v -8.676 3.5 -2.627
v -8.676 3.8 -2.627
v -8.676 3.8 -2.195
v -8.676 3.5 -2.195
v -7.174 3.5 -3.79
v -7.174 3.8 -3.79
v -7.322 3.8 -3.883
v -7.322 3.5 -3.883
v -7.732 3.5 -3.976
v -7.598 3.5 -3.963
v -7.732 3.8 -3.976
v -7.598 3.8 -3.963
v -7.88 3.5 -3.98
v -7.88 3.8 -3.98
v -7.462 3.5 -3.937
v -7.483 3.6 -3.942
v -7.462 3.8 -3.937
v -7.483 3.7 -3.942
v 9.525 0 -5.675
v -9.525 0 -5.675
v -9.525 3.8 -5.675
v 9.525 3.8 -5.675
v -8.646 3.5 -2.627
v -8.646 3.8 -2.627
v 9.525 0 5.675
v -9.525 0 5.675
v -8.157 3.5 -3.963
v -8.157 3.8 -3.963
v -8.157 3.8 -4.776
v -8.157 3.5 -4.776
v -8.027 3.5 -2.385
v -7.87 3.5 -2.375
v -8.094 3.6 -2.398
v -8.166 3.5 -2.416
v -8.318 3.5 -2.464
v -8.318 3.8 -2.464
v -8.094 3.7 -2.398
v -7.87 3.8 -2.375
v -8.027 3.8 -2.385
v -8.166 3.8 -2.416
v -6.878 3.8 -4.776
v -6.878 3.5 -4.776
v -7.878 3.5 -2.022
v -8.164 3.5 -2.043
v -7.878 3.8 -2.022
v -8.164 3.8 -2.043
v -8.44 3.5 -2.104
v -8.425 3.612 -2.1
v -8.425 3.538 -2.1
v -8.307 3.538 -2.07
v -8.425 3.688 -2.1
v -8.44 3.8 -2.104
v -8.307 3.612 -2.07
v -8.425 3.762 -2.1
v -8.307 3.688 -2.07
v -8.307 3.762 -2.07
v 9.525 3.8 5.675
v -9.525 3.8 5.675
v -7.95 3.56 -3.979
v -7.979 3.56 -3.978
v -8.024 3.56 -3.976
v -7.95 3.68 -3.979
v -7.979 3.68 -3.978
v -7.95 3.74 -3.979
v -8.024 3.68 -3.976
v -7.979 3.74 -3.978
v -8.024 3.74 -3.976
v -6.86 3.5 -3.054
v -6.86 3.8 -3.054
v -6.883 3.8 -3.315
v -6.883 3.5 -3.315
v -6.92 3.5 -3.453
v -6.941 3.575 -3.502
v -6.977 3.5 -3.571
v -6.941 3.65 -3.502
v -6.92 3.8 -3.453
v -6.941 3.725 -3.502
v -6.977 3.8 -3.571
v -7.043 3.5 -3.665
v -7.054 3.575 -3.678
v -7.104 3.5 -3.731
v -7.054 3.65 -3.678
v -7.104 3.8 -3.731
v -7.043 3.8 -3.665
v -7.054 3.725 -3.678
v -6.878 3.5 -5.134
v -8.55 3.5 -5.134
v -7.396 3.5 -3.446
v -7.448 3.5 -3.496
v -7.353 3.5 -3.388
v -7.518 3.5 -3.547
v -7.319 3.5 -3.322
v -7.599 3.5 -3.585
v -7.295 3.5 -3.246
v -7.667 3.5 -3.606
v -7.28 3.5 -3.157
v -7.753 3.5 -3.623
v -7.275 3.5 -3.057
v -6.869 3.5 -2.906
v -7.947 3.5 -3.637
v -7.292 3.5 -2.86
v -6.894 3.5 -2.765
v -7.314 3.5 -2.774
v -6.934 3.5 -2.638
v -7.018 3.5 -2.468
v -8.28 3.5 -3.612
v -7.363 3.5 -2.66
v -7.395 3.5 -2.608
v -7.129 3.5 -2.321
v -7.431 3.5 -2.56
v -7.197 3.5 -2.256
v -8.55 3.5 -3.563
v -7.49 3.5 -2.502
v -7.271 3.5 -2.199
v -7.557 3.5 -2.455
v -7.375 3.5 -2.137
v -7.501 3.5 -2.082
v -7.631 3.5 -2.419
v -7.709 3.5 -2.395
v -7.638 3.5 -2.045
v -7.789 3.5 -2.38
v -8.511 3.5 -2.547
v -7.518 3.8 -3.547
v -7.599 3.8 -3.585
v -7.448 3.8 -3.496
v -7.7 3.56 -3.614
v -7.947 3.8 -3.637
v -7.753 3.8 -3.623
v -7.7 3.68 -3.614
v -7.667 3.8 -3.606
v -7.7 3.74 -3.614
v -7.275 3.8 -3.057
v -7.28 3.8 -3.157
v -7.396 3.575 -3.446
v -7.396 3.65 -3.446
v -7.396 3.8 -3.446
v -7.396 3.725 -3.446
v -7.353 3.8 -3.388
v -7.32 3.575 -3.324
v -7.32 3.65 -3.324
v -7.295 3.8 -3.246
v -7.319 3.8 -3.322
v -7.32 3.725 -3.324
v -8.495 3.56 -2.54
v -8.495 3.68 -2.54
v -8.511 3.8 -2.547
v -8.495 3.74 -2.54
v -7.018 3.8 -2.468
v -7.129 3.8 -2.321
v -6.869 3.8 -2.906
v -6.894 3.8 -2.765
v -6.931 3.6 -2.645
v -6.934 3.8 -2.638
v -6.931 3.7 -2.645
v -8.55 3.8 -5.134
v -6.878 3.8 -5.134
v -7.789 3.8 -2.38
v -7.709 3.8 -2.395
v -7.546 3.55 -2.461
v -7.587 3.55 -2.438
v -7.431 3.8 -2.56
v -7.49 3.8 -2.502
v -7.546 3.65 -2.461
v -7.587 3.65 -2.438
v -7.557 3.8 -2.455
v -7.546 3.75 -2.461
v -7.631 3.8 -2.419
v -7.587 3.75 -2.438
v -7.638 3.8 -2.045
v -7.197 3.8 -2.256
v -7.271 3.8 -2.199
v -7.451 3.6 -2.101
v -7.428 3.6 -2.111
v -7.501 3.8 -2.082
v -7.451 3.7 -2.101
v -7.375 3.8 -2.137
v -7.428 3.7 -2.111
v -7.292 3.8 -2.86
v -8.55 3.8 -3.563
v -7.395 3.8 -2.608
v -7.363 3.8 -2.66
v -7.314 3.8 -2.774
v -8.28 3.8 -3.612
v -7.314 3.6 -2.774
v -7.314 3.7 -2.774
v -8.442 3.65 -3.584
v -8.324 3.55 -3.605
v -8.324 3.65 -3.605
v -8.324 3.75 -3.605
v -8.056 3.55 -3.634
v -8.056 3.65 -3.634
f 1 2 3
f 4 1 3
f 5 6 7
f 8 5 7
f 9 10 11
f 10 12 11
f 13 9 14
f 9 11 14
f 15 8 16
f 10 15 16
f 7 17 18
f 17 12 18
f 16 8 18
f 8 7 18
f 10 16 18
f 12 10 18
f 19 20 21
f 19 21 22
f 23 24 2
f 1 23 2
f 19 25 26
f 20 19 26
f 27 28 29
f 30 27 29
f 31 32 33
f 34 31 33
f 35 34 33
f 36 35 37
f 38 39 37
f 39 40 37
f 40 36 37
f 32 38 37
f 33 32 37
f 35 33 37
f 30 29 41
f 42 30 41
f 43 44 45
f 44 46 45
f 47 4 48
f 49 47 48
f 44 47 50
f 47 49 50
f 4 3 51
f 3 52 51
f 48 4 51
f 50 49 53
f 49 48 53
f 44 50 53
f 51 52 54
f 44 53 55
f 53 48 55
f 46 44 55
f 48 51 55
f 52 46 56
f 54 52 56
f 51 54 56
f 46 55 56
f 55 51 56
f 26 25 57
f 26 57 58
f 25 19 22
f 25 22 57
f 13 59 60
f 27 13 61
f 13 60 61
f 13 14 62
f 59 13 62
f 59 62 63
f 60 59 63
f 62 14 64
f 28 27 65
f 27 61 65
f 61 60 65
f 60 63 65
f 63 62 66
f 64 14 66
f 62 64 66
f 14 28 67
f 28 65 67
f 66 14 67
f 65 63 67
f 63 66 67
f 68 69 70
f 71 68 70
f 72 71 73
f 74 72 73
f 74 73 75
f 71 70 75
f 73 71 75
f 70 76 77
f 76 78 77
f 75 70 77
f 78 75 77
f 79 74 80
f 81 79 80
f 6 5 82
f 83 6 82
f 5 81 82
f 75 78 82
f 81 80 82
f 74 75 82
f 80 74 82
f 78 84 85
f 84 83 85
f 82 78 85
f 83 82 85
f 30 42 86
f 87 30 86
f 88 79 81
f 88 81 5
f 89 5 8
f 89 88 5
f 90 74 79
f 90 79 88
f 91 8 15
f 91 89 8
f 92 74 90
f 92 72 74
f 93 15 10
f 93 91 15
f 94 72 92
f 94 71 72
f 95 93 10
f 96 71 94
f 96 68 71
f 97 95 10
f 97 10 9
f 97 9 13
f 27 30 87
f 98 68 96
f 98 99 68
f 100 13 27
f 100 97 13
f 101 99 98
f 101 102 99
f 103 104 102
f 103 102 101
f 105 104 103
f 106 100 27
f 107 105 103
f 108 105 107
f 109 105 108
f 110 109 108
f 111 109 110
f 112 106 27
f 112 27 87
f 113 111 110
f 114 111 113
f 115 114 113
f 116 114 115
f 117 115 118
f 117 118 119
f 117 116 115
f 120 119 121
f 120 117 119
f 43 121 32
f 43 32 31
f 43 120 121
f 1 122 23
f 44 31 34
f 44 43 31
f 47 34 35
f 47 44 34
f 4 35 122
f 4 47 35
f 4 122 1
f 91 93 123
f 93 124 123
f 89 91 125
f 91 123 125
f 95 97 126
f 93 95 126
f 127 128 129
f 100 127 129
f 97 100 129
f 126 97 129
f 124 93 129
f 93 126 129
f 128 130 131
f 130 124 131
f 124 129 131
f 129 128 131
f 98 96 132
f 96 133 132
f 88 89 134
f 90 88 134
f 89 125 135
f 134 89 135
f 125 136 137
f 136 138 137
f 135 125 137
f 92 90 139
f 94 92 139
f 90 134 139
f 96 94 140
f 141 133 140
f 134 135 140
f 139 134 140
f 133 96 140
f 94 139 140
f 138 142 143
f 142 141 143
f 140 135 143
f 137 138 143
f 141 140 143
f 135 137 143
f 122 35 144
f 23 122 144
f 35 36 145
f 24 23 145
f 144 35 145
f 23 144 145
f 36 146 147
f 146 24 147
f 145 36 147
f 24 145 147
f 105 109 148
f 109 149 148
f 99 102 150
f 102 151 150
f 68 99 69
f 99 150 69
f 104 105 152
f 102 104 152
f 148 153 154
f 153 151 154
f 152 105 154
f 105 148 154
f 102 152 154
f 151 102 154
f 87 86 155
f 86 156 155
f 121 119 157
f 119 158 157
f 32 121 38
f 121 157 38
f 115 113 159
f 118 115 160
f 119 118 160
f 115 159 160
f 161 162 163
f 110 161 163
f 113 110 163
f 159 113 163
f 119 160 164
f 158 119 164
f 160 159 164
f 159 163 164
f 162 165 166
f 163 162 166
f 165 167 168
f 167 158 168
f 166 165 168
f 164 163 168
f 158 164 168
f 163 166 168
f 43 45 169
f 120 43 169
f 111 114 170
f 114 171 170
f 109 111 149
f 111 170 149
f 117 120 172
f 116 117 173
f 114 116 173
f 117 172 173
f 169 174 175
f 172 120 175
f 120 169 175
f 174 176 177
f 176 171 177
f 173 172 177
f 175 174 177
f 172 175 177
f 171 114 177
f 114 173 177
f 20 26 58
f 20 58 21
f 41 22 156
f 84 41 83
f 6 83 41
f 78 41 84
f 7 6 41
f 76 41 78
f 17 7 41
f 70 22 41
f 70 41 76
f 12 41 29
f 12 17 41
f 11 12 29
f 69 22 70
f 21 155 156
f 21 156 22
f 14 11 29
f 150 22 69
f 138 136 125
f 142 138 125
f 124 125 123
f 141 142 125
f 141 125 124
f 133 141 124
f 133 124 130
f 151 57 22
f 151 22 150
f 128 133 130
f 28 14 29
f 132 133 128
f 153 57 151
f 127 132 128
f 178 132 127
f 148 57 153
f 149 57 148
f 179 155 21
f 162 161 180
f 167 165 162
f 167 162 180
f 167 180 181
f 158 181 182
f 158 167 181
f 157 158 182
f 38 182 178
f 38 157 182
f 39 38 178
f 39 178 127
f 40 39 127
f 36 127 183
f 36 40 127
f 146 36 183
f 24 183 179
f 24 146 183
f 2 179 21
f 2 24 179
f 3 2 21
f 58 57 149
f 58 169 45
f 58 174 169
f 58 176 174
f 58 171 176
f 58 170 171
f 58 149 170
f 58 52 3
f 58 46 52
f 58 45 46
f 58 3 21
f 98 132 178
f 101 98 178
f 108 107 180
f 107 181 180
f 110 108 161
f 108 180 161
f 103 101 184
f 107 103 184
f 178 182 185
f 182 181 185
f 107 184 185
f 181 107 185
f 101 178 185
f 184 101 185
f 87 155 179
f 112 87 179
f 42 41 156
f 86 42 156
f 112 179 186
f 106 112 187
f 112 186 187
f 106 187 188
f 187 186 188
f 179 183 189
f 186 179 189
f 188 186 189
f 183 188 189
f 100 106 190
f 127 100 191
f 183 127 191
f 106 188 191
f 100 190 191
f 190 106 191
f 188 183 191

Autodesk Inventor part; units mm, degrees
ref_plane "YZ Plane" through (0, 0, 0) normal (1, 0, 0) x (0, 1, 0)
ref_plane "XZ Plane" through (0, 0, 0) normal (0, 1, 0) x (-1, 0, 0)
ref_plane "XY Plane" through (0, 0, 0) normal (0, 0, 1) x (1, 0, 0)
sketch "Sketch1" plane through (0, 0, 0) normal (0, 1, 0) x (-1, 0, 0)
  line L0 (9.525, -5.675) -> (-9.525, -5.675)
  line L1 (-9.525, -5.675) -> (-9.525, 5.675)
  line L2 (-9.525, 5.675) -> (9.525, 5.675)
  line L3 (9.525, 5.675) -> (9.525, -5.675)
  point P0 (0, 0)
  point P1 (0, 0)
  dimension "d0" = 19.05
  dimension "d1" = 11.35
extrude "Extrusion1" add sketch "Sketch1" along normal blind 3.8
sketch "Sketch2" plane through (0, 3.8, 0) normal (0, 1, 0) x (1, 0, 0)
  line L0 (-8.9301, 5.134) -> (-6.6428, 5.134) construction
  line L1 (-6.6428, 5.134) -> (-6.6428, 2.0218) construction
  line L2 (-6.6428, 2.0218) -> (-8.9301, 2.0218) construction
  line L3 (-8.9301, 2.0218) -> (-8.9301, 5.134) construction
  spline S0 degree 2 poles (-6.8602, 3.0543) (-6.8602, 2.8344) (-7.001, 2.459) (-7.1294, 2.3207) knots 0 0 0 1 2 2 2
  spline S1 degree 2 poles (-7.1294, 2.3207) (-7.2579, 2.1823) (-7.6407, 2.0218) (-7.8778, 2.0218) knots 0 0 0 1 2 2 2
  spline S2 degree 2 poles (-7.8778, 2.0218) (-8.0952, 2.0218) (-8.52, 2.1181) (-8.6757, 2.1947) knots 0 0 0 1 2 2 2
  line L4 (-8.6757, 2.1947) -> (-8.6757, 2.6269)
  line L5 (-8.6757, 2.6269) -> (-8.646, 2.6269)
  spline S3 degree 2 poles (-8.646, 2.6269) (-8.5991, 2.5924) (-8.4237, 2.5034) (-8.3175, 2.4639) knots 0 0 0 1 2 2 2
  spline S4 degree 2 poles (-8.3175, 2.4639) (-8.1965, 2.4219) (-7.9964, 2.375) (-7.8704, 2.375) knots 0 0 0 1 2 2 2
  spline S5 degree 2 poles (-7.8704, 2.375) (-7.7469, 2.375) (-7.5147, 2.4639) (-7.4308, 2.5603) knots 0 0 0 1 2 2 2
  spline S6 degree 2 poles (-7.4308, 2.5603) (-7.3542, 2.6516) (-7.2752, 2.8937) (-7.2752, 3.0567) knots 0 0 0 1 2 2 2
  spline S7 degree 2 poles (-7.2752, 3.0567) (-7.2752, 3.2197) (-7.3641, 3.4272) (-7.4481, 3.4964) knots 0 0 0 1 2 2 2
  spline S8 degree 2 poles (-7.4481, 3.4964) (-7.5345, 3.573) (-7.7914, 3.6372) (-7.947, 3.6372) knots 0 0 0 1 2 2 2
  spline S9 degree 2 poles (-7.947, 3.6372) (-8.115, 3.6372) (-8.4484, 3.5853) (-8.5497, 3.5631) knots 0 0 0 1 2 2 2
  line L6 (-8.5497, 3.5631) -> (-8.5497, 5.134)
  line L7 (-8.5497, 5.134) -> (-6.8775, 5.134)
  line L8 (-6.8775, 5.134) -> (-6.8775, 4.7759)
  line L9 (-6.8775, 4.7759) -> (-8.157, 4.7759)
  line L10 (-8.157, 4.7759) -> (-8.157, 3.9632)
  spline S10 degree 2 poles (-8.157, 3.9632) (-8.0829, 3.9731) (-7.9396, 3.9805) (-7.8803, 3.9805) knots 0 0 0 1 2 2 2
  spline S11 degree 2 poles (-7.8803, 3.9805) (-7.6457, 3.9805) (-7.3221, 3.9039) (-7.1739, 3.7903) knots 0 0 0 1 2 2 2
  spline S12 degree 2 poles (-7.1739, 3.7903) (-7.0232, 3.6767) (-6.8602, 3.3309) (-6.8602, 3.0543) knots 0 0 0 1 2 2 2
  point P0 (0, 0)
emboss "Emboss1" sketch "Sketch2" operation cut depth 0.3 direction (0, -1, 0)
properties part number "5gram weight"
